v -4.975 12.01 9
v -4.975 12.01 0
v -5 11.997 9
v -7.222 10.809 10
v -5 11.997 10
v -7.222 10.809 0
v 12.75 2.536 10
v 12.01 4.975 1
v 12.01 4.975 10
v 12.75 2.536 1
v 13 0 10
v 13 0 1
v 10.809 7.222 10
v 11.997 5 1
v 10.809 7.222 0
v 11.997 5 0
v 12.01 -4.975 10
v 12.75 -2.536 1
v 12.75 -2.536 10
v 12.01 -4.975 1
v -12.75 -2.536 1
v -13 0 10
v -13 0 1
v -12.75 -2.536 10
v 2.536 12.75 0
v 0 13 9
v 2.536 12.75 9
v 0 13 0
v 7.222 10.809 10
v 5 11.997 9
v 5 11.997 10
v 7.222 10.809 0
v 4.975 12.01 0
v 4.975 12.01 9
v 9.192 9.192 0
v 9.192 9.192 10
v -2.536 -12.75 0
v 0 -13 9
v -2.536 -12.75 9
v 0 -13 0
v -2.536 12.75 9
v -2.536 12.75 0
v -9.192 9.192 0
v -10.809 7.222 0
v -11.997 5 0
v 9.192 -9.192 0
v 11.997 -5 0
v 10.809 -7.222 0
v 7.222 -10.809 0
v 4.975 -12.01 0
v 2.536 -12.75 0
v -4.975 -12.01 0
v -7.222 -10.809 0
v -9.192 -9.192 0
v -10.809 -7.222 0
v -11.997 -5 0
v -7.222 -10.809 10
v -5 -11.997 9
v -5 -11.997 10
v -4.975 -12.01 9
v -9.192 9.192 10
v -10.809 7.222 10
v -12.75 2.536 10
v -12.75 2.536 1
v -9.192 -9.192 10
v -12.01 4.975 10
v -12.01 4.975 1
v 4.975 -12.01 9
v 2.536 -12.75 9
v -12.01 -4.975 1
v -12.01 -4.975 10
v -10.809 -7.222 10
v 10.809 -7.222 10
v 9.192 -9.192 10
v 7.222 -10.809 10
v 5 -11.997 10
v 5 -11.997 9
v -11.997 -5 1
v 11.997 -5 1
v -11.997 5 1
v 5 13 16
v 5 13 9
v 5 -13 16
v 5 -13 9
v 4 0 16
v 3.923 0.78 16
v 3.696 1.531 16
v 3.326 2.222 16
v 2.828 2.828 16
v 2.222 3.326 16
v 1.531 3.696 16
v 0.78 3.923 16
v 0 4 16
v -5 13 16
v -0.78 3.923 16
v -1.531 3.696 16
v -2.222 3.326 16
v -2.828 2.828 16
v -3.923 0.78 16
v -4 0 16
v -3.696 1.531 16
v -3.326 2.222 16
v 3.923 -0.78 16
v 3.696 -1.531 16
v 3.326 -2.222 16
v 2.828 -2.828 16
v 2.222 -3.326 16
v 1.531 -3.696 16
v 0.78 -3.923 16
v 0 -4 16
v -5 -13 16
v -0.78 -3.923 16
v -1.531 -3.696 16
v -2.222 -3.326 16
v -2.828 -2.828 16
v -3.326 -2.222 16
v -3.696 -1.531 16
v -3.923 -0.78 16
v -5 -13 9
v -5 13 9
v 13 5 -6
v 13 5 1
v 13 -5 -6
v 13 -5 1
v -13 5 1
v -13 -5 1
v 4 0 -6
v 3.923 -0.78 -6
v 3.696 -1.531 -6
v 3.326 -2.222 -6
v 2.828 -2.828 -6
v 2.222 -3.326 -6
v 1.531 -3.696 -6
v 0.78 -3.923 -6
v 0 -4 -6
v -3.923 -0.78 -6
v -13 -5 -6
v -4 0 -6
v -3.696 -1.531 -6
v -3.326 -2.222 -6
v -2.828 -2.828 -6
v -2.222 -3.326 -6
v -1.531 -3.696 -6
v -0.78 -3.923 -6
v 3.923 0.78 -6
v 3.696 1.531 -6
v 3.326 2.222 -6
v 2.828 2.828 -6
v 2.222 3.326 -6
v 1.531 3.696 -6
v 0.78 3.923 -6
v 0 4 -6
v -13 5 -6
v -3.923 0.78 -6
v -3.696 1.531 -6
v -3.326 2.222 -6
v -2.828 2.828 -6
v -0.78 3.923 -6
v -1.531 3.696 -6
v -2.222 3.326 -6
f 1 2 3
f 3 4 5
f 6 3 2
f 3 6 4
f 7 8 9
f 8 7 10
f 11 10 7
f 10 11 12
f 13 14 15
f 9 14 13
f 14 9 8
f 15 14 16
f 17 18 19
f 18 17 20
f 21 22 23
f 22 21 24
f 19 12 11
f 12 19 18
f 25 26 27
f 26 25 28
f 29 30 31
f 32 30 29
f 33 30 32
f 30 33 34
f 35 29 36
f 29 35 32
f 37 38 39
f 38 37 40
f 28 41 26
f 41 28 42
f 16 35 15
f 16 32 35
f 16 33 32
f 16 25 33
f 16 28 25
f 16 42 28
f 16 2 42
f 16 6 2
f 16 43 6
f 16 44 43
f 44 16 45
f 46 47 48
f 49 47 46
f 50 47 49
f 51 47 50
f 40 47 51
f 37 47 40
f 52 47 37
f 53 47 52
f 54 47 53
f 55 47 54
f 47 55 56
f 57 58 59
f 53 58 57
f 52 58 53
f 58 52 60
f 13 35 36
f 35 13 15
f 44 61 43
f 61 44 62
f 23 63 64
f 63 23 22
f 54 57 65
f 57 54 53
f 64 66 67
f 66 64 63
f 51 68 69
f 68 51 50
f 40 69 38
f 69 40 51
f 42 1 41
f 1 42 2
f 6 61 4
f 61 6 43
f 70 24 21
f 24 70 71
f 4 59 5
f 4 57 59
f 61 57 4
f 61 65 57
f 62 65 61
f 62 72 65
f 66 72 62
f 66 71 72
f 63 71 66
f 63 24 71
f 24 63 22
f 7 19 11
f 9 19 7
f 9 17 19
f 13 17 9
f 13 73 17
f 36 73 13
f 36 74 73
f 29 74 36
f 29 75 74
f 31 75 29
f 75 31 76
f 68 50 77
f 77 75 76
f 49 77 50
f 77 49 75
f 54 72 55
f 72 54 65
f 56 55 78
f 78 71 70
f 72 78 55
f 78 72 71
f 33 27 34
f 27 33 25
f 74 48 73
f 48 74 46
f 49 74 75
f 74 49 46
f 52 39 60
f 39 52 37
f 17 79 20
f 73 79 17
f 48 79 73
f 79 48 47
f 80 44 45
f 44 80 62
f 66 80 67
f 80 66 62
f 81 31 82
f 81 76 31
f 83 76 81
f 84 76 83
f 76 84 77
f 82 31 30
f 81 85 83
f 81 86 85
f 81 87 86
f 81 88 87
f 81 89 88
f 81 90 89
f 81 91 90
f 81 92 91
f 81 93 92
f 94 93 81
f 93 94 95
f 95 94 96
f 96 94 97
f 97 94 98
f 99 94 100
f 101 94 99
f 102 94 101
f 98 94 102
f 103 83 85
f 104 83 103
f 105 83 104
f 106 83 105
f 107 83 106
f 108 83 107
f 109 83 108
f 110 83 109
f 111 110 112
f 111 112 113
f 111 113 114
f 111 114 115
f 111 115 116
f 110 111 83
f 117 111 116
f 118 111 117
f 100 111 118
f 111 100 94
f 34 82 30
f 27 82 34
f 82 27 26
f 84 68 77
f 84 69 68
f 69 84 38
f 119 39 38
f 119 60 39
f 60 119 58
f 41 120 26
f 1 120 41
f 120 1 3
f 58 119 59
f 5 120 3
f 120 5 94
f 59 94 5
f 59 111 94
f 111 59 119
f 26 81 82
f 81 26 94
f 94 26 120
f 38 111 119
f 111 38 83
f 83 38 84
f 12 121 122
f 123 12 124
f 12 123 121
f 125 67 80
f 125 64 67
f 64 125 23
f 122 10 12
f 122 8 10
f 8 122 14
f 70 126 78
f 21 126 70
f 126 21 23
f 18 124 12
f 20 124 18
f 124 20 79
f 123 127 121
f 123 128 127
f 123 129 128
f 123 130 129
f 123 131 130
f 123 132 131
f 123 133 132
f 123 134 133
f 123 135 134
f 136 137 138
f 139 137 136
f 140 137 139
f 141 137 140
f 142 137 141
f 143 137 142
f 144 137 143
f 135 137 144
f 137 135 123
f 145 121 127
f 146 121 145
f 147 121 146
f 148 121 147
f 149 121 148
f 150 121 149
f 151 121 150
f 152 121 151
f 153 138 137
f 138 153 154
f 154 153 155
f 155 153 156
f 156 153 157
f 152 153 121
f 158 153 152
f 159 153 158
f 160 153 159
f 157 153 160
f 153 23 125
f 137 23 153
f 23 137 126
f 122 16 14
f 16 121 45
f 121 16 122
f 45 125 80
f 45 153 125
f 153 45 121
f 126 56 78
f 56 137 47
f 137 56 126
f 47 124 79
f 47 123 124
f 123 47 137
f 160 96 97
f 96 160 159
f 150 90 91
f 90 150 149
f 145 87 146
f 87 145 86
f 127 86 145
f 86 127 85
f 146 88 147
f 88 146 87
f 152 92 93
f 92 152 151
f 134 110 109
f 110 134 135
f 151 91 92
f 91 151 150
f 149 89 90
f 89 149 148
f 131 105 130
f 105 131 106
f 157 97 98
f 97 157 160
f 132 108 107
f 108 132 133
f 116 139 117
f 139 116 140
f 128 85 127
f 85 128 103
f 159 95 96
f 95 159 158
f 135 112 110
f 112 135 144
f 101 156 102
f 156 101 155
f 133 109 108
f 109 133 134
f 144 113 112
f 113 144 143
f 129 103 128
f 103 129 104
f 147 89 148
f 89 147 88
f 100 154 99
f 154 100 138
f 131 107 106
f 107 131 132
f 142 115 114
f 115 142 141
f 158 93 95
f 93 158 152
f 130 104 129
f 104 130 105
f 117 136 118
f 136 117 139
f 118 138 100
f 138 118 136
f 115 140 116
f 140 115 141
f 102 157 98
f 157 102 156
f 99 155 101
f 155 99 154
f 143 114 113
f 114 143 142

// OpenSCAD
$fn = 32;

// ----------------------------------------------------------------------
// Oldham coupling disc: 26 x 22 mm
// ----------------------------------------------------------------------

// --- parameters (mm) ---
disc_d = 26;              // disc diameter
disc_t = 10;              // disc thickness
tongue_w = 10;            // tongue width
tongue_h = 6;             // tongue height
bore_d = 8;               // centre lightening bore

module disc() {
  cylinder(h = disc_t, d = disc_d);
  /* tongue on the top face, sunk 1 mm into the disc */
  translate([-tongue_w / 2, -disc_d / 2, disc_t - 1]) cube([tongue_w, disc_d, tongue_h + 1]);
  /* slot wall on the bottom face, 90 degrees turned */
  translate([-disc_d / 2, -tongue_w / 2, -tongue_h]) cube([disc_d, tongue_w, tongue_h + 1]);
}

difference() {
  disc();
  translate([0, 0, -tongue_h - 1]) cylinder(h = disc_t + 2 * tongue_h + 2, d = bore_d);
}
